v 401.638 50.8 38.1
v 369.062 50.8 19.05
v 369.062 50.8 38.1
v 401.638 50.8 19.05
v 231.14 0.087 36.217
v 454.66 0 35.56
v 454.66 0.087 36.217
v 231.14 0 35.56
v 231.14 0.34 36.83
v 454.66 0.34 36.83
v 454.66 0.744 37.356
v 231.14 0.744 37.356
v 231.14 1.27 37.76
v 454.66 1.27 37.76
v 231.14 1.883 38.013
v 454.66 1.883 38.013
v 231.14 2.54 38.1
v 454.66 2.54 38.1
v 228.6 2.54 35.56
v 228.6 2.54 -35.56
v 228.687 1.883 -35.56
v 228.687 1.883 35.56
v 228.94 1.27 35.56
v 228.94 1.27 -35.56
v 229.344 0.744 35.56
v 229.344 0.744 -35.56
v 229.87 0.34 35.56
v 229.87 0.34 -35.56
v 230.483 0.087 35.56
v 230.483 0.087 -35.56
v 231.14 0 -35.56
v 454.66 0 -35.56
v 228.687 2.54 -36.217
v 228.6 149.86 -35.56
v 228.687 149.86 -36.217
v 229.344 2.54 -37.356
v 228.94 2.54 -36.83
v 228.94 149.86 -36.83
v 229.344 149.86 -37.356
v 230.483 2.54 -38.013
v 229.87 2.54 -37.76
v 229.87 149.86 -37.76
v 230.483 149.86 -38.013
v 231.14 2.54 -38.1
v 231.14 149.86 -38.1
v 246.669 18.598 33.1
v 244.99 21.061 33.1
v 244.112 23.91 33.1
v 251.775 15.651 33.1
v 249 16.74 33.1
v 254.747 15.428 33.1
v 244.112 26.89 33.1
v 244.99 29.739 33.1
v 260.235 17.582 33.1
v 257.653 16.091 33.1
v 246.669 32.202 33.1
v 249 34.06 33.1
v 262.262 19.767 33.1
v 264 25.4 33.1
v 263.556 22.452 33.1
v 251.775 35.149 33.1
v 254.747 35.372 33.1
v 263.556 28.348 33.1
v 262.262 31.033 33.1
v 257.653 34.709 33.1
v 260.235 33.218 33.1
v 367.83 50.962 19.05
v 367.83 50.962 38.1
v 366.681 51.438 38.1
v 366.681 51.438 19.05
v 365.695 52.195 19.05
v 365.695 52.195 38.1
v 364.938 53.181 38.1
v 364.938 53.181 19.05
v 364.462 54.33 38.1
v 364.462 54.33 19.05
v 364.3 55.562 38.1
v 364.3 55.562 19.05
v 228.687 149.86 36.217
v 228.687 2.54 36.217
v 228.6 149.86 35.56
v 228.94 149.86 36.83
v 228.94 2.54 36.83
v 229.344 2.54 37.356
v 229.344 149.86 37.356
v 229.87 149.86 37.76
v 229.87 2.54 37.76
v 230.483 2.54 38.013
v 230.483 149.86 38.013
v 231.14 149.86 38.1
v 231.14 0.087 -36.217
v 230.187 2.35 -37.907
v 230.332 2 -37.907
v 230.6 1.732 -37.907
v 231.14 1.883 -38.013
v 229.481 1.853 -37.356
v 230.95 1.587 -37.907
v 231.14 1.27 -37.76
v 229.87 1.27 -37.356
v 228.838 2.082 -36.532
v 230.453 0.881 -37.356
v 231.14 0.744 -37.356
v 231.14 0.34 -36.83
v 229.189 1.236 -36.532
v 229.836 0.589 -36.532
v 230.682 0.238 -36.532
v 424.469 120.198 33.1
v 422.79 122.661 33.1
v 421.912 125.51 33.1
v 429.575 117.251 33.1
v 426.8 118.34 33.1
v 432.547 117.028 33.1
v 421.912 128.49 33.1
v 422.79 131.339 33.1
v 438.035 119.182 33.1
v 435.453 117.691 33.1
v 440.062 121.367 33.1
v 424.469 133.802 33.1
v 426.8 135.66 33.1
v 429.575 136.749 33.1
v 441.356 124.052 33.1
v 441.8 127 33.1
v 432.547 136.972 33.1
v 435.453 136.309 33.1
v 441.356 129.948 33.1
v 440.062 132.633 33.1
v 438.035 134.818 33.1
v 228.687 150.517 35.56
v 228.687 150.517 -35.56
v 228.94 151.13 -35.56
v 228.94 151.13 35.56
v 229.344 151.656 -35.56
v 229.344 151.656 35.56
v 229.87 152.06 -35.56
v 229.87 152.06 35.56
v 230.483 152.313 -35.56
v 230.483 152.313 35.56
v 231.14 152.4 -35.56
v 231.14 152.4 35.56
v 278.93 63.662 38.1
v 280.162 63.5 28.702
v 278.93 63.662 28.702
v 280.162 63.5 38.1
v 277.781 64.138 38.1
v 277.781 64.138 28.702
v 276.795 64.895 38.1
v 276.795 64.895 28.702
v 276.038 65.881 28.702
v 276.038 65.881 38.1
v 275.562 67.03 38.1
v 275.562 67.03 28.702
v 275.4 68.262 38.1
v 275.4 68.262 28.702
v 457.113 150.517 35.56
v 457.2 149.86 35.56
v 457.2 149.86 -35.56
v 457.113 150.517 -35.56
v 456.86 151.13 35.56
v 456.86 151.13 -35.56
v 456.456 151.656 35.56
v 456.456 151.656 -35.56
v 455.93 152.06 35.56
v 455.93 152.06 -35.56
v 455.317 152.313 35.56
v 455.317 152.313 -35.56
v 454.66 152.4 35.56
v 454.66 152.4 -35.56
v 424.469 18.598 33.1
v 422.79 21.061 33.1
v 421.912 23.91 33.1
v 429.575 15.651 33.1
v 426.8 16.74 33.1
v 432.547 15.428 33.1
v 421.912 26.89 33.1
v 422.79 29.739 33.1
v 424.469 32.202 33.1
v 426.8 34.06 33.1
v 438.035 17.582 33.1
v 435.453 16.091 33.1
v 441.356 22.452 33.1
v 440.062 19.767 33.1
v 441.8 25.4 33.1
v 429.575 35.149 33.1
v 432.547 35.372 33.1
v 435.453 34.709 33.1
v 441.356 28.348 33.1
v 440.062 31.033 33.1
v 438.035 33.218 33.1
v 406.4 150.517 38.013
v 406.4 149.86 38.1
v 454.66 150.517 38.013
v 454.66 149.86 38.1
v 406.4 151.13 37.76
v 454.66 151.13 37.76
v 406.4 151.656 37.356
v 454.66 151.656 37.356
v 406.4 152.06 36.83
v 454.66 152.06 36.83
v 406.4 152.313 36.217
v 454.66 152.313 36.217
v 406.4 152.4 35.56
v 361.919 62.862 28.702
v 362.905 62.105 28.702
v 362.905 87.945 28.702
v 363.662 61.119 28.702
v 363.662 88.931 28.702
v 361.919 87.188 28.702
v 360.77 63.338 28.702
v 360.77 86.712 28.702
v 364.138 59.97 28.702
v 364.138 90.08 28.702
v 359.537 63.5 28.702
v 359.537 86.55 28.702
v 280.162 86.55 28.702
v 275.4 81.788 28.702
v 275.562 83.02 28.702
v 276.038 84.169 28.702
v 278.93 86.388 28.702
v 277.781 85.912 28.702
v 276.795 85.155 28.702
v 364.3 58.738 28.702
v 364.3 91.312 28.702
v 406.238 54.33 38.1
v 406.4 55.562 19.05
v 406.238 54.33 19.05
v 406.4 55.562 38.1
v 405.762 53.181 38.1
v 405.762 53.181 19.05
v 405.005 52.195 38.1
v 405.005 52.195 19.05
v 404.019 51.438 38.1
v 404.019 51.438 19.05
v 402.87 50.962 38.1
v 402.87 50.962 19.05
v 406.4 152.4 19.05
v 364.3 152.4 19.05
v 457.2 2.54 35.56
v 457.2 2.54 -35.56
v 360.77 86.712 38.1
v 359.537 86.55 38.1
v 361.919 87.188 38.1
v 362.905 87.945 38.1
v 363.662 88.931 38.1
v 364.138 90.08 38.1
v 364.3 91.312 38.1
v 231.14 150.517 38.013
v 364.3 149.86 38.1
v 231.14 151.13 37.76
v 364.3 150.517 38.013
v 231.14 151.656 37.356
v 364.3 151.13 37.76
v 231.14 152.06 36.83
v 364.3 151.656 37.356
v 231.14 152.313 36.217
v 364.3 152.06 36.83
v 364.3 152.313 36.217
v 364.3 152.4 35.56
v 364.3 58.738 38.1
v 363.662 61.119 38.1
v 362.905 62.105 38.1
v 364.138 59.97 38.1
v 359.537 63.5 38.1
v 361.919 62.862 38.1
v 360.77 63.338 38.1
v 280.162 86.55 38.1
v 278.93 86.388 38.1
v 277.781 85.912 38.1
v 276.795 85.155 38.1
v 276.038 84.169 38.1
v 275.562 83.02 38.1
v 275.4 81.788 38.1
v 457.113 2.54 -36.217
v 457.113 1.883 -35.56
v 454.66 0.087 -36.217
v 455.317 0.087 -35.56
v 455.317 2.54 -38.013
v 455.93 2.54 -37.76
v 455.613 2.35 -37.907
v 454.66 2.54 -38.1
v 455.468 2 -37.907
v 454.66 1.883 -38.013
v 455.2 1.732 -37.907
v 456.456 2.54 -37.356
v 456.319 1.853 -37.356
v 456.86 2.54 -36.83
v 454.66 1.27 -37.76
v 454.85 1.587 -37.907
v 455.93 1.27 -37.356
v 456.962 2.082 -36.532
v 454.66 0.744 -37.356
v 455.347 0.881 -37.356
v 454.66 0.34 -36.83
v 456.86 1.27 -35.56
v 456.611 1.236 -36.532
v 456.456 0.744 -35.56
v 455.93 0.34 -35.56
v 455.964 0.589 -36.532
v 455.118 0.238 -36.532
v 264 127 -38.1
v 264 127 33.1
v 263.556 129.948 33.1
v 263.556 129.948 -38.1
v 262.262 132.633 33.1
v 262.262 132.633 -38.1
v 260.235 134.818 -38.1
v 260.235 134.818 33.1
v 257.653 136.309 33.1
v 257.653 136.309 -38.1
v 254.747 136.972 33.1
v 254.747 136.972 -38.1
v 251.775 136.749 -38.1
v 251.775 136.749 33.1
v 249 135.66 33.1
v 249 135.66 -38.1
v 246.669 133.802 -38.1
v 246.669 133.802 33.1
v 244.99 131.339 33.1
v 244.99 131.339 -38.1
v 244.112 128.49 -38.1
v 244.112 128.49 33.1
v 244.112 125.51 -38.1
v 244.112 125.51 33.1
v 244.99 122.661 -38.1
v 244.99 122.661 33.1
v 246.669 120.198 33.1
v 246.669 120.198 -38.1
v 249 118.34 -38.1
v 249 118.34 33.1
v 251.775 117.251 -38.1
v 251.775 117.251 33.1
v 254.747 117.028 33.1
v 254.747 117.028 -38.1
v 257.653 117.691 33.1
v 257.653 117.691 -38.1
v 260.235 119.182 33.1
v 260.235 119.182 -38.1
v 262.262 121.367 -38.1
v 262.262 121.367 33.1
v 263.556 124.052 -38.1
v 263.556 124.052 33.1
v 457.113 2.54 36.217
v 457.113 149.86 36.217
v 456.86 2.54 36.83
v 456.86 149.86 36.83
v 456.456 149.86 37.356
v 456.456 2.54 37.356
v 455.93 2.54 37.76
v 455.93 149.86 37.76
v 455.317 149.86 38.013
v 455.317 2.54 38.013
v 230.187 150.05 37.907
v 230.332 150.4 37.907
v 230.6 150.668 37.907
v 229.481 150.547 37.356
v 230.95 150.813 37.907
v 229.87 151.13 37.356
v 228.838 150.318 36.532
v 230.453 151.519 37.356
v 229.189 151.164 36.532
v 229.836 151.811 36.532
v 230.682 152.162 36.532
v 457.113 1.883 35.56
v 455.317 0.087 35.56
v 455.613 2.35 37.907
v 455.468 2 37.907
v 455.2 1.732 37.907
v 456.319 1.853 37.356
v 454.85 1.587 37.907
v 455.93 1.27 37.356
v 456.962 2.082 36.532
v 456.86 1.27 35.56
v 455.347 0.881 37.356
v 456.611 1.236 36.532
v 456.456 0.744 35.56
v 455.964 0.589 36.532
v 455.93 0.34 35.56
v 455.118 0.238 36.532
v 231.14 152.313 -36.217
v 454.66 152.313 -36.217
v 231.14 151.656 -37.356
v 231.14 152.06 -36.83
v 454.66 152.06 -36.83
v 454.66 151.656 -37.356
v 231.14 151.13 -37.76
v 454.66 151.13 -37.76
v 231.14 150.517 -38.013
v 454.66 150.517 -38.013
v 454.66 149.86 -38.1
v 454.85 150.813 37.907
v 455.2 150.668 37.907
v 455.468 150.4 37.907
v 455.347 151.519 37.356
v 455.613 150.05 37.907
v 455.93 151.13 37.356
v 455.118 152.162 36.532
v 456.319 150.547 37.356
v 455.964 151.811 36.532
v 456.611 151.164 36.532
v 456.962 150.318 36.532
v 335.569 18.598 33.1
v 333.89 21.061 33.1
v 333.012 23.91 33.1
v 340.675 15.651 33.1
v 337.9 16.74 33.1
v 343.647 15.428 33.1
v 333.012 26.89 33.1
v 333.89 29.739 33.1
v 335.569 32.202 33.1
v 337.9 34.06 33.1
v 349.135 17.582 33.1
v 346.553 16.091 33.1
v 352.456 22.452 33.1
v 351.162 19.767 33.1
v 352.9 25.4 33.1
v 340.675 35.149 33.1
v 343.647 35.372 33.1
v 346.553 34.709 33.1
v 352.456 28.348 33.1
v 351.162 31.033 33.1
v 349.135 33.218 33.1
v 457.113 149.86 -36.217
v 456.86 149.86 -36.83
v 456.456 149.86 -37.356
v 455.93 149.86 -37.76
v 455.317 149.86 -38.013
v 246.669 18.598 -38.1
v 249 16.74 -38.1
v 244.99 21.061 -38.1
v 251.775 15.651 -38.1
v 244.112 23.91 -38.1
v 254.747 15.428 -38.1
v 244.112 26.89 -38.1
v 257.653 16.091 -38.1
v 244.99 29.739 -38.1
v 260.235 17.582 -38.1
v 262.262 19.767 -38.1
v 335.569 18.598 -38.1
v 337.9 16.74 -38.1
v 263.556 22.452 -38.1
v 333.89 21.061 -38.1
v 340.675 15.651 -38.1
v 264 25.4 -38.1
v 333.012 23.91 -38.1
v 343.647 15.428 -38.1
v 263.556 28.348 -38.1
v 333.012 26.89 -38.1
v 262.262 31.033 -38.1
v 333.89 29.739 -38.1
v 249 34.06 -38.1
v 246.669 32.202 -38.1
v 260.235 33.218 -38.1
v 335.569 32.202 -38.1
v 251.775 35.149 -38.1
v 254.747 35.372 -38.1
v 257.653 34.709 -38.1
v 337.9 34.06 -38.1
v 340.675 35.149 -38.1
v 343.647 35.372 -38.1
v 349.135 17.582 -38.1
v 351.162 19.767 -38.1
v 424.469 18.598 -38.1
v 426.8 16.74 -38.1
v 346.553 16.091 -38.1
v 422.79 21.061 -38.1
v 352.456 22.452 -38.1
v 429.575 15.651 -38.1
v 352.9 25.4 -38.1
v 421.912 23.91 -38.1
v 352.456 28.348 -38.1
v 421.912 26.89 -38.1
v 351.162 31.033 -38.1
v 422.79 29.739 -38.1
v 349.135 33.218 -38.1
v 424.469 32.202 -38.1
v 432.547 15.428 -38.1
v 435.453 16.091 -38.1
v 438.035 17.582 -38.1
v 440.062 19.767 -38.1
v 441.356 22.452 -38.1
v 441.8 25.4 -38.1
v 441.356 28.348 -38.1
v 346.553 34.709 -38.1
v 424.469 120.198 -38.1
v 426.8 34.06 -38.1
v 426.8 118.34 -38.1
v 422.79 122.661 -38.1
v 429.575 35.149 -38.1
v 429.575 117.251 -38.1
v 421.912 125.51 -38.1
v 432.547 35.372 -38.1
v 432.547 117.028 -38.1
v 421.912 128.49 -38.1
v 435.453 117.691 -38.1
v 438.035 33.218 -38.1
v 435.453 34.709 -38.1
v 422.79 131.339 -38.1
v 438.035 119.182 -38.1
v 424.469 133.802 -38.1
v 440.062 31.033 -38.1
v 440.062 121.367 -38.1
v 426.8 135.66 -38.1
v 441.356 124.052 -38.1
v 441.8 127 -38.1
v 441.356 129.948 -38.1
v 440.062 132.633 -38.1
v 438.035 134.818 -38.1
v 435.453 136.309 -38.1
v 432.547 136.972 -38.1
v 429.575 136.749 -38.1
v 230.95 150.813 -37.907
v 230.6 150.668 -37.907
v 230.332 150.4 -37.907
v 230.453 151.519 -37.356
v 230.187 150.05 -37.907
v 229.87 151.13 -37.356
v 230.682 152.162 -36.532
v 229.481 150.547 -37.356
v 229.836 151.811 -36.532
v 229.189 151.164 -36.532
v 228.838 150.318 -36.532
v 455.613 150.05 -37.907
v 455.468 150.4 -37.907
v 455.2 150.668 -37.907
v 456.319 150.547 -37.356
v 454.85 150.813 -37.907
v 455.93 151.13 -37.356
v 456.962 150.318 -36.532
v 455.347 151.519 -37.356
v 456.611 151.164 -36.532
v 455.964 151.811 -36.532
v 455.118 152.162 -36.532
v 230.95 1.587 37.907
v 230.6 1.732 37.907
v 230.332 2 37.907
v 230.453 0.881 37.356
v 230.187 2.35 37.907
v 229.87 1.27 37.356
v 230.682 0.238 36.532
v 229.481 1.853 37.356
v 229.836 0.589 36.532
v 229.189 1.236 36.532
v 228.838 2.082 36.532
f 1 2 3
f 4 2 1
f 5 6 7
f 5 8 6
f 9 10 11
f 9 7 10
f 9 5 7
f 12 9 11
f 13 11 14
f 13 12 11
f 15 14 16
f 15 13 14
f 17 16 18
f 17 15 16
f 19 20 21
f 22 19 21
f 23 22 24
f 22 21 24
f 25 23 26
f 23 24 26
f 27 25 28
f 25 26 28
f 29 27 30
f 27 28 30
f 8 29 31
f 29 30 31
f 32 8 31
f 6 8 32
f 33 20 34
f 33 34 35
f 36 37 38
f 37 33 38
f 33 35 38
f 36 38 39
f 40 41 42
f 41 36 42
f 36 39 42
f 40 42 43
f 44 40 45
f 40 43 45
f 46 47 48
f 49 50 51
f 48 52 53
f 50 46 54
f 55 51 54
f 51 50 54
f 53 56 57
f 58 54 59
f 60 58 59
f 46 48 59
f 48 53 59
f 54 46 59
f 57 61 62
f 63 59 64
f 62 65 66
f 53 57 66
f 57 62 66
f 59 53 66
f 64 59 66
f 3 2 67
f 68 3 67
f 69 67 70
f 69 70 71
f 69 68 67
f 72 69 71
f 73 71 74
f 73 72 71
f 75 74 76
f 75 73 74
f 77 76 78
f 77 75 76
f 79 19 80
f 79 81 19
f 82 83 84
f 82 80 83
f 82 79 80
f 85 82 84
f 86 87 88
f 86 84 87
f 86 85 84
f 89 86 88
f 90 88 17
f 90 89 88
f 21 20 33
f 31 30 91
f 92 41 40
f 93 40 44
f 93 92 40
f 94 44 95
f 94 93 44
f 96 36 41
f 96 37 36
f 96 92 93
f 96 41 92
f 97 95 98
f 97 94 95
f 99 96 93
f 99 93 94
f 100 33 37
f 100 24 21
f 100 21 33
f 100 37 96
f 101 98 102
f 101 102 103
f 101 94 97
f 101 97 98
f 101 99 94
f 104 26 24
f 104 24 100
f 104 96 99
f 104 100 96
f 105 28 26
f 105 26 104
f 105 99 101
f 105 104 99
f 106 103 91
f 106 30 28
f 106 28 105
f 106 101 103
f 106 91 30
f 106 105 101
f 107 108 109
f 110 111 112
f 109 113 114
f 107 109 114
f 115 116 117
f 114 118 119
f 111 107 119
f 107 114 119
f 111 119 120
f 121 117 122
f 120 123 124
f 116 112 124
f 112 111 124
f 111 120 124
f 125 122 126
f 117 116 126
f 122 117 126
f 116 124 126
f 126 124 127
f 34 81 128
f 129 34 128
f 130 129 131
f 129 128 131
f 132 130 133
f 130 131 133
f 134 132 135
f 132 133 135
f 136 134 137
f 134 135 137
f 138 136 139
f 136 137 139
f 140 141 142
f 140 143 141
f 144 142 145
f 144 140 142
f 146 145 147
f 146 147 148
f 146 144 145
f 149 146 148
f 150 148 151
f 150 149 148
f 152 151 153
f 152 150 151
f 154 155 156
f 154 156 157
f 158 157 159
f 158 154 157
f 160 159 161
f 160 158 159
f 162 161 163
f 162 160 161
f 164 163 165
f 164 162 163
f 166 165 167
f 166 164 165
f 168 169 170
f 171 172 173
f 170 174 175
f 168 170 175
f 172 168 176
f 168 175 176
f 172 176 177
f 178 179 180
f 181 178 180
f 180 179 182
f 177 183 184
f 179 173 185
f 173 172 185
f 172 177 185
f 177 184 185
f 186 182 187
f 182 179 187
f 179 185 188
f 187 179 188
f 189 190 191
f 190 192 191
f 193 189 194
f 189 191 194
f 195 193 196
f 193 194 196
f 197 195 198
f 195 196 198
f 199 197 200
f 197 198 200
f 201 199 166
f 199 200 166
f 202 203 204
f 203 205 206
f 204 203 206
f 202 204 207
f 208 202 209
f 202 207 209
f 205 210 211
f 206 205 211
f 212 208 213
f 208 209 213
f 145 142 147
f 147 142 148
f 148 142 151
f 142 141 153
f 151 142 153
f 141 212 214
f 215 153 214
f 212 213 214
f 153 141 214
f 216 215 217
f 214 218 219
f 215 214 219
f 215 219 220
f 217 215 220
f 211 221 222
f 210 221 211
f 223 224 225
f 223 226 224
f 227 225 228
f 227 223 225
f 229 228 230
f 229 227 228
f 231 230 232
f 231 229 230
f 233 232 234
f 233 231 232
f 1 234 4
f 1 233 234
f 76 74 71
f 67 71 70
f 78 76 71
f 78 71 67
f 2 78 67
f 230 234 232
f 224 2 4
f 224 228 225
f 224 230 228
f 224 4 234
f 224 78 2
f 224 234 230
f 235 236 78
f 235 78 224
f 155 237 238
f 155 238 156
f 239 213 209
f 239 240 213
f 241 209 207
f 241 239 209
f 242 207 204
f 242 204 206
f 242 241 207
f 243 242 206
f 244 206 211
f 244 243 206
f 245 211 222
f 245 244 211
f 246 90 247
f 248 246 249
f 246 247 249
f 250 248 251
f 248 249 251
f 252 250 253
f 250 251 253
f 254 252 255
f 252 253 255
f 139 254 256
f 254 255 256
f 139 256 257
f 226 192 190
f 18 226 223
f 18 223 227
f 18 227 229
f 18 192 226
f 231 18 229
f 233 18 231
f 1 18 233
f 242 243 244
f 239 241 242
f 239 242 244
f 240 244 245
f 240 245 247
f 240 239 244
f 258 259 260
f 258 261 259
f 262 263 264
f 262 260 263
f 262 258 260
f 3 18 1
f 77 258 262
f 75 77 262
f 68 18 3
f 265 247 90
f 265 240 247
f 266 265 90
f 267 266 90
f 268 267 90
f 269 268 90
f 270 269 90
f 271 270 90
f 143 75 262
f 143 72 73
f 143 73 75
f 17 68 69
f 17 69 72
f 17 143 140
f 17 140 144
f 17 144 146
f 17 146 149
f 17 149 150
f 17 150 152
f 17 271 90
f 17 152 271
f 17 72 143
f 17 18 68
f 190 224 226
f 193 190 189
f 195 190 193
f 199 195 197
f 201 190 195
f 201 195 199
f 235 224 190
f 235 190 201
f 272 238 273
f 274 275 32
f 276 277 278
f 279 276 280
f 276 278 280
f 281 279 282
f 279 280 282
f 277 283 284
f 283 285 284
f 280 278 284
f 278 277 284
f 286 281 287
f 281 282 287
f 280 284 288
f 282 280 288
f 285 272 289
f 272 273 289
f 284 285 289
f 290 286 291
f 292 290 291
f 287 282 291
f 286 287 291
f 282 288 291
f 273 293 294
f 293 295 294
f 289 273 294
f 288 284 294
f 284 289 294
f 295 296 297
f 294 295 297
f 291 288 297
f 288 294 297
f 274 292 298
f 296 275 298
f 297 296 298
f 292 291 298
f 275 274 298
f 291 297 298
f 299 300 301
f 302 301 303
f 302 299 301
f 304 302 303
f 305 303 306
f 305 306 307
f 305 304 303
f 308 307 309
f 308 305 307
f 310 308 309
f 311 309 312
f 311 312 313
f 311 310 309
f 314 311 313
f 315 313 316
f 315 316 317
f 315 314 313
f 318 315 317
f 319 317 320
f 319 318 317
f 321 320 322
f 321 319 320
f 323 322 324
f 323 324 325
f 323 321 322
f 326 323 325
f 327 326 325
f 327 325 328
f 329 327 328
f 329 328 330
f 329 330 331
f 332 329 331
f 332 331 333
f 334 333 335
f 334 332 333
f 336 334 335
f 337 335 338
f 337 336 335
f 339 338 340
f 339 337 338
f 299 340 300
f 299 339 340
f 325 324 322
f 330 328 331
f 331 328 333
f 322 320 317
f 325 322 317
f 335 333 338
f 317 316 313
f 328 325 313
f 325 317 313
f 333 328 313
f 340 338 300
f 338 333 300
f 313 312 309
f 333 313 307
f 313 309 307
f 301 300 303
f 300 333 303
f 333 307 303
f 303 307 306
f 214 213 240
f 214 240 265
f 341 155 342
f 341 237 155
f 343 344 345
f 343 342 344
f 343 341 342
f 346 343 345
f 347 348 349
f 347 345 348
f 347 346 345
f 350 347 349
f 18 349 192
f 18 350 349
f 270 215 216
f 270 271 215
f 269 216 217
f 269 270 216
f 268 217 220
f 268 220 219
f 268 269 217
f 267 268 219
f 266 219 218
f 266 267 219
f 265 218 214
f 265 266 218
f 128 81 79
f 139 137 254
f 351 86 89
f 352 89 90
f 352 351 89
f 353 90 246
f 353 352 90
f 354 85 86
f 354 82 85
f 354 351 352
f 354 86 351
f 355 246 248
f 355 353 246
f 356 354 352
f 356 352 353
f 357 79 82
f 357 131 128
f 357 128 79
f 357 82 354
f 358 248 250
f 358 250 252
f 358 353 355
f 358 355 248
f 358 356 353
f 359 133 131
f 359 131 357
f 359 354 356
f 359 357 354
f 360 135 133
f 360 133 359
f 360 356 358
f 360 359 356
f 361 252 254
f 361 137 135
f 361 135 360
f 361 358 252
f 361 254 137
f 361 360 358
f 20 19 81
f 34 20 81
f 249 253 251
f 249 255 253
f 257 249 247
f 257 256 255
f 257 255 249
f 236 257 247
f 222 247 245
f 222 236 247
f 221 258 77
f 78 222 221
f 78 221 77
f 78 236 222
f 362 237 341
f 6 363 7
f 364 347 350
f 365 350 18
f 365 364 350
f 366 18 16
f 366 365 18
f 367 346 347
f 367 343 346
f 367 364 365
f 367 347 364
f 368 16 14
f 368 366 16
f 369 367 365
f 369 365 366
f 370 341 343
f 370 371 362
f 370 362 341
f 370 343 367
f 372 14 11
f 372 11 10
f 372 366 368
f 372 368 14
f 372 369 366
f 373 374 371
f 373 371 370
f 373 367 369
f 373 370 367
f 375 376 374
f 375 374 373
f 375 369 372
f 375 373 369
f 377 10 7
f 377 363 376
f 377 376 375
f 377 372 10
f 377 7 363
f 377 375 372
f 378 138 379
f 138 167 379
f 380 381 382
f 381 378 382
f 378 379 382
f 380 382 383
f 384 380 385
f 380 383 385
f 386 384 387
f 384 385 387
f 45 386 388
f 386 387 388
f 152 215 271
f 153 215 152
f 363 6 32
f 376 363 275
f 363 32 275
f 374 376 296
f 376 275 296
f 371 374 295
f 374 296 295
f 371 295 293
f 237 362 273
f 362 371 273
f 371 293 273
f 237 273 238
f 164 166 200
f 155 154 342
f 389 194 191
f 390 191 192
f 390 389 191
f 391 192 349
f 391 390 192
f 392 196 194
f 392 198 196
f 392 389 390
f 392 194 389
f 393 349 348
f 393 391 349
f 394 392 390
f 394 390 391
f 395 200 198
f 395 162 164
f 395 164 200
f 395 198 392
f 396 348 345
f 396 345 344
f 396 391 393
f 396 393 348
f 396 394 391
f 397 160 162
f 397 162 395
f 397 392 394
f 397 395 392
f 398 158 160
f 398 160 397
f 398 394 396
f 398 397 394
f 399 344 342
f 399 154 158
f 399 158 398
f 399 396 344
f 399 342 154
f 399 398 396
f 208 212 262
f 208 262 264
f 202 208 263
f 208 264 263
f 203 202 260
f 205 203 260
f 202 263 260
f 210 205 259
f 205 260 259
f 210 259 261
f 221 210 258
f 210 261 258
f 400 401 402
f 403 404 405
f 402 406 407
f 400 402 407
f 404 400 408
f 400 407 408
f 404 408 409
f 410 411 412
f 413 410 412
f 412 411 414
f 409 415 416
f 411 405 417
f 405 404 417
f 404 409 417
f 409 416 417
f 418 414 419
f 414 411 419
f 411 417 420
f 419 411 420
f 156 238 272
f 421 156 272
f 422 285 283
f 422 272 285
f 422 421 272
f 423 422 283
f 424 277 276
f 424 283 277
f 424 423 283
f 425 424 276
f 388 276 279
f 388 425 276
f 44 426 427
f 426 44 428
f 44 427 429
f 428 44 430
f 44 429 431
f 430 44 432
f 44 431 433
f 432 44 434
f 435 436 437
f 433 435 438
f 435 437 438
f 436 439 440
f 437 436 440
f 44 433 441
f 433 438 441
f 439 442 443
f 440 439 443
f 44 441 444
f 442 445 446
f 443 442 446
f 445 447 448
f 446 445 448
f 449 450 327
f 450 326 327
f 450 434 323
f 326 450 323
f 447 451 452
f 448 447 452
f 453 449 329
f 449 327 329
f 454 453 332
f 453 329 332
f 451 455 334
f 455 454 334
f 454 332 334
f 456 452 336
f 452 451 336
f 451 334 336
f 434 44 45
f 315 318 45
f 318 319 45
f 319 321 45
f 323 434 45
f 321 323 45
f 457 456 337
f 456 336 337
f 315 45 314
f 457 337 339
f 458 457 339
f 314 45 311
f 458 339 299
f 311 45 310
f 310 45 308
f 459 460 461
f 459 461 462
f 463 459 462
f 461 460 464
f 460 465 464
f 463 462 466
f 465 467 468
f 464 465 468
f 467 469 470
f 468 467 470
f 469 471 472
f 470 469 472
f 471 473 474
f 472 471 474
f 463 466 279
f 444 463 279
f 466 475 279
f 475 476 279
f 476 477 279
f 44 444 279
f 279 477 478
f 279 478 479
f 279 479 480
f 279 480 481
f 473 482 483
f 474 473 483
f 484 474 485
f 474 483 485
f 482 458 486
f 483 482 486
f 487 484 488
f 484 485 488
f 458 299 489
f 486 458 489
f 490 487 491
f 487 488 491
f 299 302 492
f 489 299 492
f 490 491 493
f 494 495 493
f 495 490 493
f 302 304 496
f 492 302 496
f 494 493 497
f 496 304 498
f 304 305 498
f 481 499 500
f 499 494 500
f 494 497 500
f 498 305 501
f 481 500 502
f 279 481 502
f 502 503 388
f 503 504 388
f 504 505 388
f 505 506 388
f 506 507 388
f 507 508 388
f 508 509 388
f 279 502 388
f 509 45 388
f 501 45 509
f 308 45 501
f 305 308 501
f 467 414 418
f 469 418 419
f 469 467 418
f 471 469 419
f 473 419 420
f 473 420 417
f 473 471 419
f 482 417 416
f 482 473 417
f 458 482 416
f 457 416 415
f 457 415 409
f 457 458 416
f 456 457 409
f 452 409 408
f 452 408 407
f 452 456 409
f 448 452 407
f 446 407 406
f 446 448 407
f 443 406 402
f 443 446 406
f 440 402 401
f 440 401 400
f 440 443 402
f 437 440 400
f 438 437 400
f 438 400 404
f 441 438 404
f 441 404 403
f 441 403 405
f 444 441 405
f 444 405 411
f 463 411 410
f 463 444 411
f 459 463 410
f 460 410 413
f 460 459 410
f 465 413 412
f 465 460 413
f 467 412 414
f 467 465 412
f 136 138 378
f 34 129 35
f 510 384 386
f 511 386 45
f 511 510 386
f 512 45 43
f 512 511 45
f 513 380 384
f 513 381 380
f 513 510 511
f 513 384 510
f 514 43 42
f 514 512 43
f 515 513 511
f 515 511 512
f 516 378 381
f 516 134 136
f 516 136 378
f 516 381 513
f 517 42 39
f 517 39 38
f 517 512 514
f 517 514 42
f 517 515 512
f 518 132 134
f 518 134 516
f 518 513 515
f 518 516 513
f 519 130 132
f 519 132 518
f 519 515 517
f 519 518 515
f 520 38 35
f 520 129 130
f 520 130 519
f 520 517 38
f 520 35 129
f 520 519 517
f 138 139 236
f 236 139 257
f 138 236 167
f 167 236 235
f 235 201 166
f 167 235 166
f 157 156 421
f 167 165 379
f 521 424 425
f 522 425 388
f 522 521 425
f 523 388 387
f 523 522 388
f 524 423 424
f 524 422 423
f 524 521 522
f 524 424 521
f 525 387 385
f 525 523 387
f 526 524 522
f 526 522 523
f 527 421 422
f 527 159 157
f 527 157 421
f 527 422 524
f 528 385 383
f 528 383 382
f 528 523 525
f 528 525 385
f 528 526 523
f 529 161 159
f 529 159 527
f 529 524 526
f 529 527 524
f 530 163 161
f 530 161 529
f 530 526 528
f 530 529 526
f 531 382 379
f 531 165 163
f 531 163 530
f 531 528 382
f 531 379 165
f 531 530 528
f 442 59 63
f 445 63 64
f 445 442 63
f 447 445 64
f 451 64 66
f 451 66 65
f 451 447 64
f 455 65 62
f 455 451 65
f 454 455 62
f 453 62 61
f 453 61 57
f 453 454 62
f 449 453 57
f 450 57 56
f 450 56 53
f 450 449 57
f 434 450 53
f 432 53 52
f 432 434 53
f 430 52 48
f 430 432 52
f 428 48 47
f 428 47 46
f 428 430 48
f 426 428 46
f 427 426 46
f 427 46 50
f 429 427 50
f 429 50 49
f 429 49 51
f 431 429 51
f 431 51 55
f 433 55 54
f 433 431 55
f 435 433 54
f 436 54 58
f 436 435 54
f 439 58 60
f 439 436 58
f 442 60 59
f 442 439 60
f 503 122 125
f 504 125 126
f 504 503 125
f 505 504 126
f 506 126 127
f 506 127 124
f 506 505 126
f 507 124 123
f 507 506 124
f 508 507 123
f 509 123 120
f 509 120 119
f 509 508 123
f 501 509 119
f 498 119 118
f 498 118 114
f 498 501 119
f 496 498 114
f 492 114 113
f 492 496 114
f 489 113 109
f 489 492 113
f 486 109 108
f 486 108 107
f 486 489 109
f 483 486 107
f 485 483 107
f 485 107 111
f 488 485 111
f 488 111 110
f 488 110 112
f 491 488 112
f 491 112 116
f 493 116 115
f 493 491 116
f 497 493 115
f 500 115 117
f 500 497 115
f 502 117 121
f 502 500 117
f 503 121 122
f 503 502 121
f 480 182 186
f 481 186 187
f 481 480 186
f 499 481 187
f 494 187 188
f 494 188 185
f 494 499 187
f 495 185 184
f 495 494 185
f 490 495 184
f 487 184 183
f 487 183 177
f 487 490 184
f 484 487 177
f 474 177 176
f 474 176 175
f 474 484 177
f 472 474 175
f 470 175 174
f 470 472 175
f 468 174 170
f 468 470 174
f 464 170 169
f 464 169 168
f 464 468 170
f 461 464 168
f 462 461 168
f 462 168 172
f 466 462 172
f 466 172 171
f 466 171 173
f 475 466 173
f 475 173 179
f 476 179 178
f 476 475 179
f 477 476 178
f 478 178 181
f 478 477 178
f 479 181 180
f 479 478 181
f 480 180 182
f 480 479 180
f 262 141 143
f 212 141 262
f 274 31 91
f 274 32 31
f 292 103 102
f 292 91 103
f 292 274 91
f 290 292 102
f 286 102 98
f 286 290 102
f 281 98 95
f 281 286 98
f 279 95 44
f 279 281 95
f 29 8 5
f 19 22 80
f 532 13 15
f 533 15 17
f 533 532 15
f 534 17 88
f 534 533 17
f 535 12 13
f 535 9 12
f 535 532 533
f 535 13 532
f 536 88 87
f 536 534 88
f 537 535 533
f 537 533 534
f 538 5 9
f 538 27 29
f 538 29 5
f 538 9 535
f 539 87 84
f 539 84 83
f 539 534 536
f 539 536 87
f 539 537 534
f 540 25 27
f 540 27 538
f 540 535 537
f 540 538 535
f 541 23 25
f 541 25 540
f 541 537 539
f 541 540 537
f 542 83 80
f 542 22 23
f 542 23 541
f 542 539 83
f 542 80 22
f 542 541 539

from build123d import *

# Parameters (mm, degrees)
SALIENTE_EXTRUIR1_DEPTH = 19.05
SALIENTE_EXTRUIR2_DEPTH = 38.1
CROQUIS1_5_W            = 88.9
CROQUIS1_5_H            = 19.05
SALIENTE_EXTRUIR3_DEPTH = 28.702
CROQUIS2_W              = 42.1
CROQUIS2_H              = 101.6
CORTAR_EXTRUIR1_DEPTH   = 19.05
REDONDEO1_R             = 4.7625
CROQUIS4_W              = 84.9
CROQUIS4_H              = 38.1
SALIENTE_EXTRUIR4_DEPTH = 15.05
CROQUIS5_W              = 228.6
CROQUIS5_H              = 152.4
SALIENTE_EXTRUIR5_DEPTH = 38.1
REDONDEO2_R             = 2.54
CROQUIS6_R              = 10
CORTAR_EXTRUIR2_DEPTH   = 71.2
CROQUIS7_W              = 228.6
CROQUIS7_H              = 156.90491855
CORTAR_EXTRUIR3_DEPTH   = 488.918066892


with BuildPart() as part:
    # Croquis1 → Saliente-Extruir1 (new body)
    with BuildSketch(Plane.XY):
        Polygon((0, 0), (0, 152.4), (143.7, 152.4), (143.7, 137.35), (228.6, 137.35), (228.6, 0), align=None)
    extrude(amount=SALIENTE_EXTRUIR1_DEPTH)

    # Croquis1<4> → Saliente-Extruir2 (add)
    with BuildSketch(Plane.XY):
        Polygon((0, 152.4), (0, 0), (228.6, 0), (228.6, 137.35), (143.7, 137.35), (143.7, 152.4), (92.9, 152.4), (92.9, 86.55), (181.8, 86.55), (181.8, 63.5), (92.9, 63.5), (92.9, 50.8), (50.8, 50.8), (50.8, 152.4), align=None)
    extrude(amount=SALIENTE_EXTRUIR2_DEPTH)

    # Croquis1<5> → Saliente-Extruir3 (add)
    with BuildSketch(Plane.XY):
        with Locations((135.35, 75.025)):
            Rectangle(CROQUIS1_5_W, CROQUIS1_5_H)
        Polygon((92.9, 65.5), (92.9, 63.5), (181.8, 63.5), (181.8, 86.55), (92.9, 86.55), (92.9, 84.55), (179.8, 84.55), (179.8, 65.5), align=None)
    extrude(amount=SALIENTE_EXTRUIR3_DEPTH)

    # Croquis2 → Cortar-Extruir1 (cut)
    with BuildSketch(Plane.XY.offset(38.1)):
        with Locations((71.85, 101.6)):
            Rectangle(CROQUIS2_W, CROQUIS2_H)
    extrude(amount=-CORTAR_EXTRUIR1_DEPTH, mode=Mode.SUBTRACT)

    # Redondeo1
    redondeo1_edges = [part.edges().sort_by_distance(p)[0] for p in [
        (92.9, 86.55, 33.401),
        (181.8, 86.55, 33.401),
        (181.8, 63.5, 33.401),
        (92.9, 63.5, 33.401),
        (92.9, 50.8, 28.575),
        (50.8, 50.8, 28.575),
    ]]
    fillet(redondeo1_edges, radius=REDONDEO1_R)

    # Croquis4 → Saliente-Extruir4 (add)
    with BuildSketch(Plane(origin=(0, 137.35, 0), x_dir=(1, 0, 0), z_dir=(0, 1, 0))):
        with Locations((186.15, -19.05)):
            Rectangle(CROQUIS4_W, CROQUIS4_H)
    extrude(amount=SALIENTE_EXTRUIR4_DEPTH)

    # Croquis5 → Saliente-Extruir5 (add)
    with BuildSketch(Plane(origin=(0, 0, 0), x_dir=(-1, 0, 0), z_dir=(0, 0, -1))):
        with Locations((-114.3, 76.2)):
            Rectangle(CROQUIS5_W, CROQUIS5_H)
    extrude(amount=SALIENTE_EXTRUIR5_DEPTH)

    # Redondeo2
    redondeo2_edges = [part.edges().sort_by_distance(p)[0] for p in [
        (228.6, 0, 0),
        (0, 0, 0),
        (0, 152.4, 0),
        (228.6, 152.4, 0),
        (0, 76.2, -38.1),
        (114.3, 152.4, -38.1),
        (228.6, 76.2, -38.1),
        (114.3, 0, -38.1),
        (25.4, 152.4, 38.1),
        (0, 76.2, 38.1),
        (114.3, 0, 38.1),
        (228.6, 76.2, 38.1),
        (160.75, 152.4, 38.1),
    ]]
    fillet(redondeo2_edges, radius=REDONDEO2_R)

    # Croquis6 → Cortar-Extruir2 (cut)
    with BuildSketch(Plane(origin=(0, 0, -38.1), x_dir=(-1, 0, 0), z_dir=(0, 0, -1))):
        with Locations((-25.4, 127)):
            Circle(CROQUIS6_R)
        with Locations((-203.2, 127)):
            Circle(CROQUIS6_R)
        with Locations((-203.2, 25.4)):
            Circle(CROQUIS6_R)
        with Locations((-25.4, 25.4)):
            Circle(CROQUIS6_R)
        with Locations((-114.3, 25.4)):
            Circle(CROQUIS6_R)
    extrude(amount=-CORTAR_EXTRUIR2_DEPTH, mode=Mode.SUBTRACT)

    # Simetría1: part across plane


with BuildPart() as part_1:
    add(part.part)
    add(part.part.mirror(Plane(origin=(228.6, 0, 19.05), x_dir=(0, 0, 1), z_dir=(1, 0, 0))))

    # Croquis7 → Cortar-Extruir3 (cut, through all)
    with BuildSketch(Plane.XY.offset(38.1)):
        with Locations((114.3, 78.452459275)):
            Rectangle(CROQUIS7_W, CROQUIS7_H)
    extrude(amount=-CORTAR_EXTRUIR3_DEPTH, mode=Mode.SUBTRACT)


solid = part_1.part
